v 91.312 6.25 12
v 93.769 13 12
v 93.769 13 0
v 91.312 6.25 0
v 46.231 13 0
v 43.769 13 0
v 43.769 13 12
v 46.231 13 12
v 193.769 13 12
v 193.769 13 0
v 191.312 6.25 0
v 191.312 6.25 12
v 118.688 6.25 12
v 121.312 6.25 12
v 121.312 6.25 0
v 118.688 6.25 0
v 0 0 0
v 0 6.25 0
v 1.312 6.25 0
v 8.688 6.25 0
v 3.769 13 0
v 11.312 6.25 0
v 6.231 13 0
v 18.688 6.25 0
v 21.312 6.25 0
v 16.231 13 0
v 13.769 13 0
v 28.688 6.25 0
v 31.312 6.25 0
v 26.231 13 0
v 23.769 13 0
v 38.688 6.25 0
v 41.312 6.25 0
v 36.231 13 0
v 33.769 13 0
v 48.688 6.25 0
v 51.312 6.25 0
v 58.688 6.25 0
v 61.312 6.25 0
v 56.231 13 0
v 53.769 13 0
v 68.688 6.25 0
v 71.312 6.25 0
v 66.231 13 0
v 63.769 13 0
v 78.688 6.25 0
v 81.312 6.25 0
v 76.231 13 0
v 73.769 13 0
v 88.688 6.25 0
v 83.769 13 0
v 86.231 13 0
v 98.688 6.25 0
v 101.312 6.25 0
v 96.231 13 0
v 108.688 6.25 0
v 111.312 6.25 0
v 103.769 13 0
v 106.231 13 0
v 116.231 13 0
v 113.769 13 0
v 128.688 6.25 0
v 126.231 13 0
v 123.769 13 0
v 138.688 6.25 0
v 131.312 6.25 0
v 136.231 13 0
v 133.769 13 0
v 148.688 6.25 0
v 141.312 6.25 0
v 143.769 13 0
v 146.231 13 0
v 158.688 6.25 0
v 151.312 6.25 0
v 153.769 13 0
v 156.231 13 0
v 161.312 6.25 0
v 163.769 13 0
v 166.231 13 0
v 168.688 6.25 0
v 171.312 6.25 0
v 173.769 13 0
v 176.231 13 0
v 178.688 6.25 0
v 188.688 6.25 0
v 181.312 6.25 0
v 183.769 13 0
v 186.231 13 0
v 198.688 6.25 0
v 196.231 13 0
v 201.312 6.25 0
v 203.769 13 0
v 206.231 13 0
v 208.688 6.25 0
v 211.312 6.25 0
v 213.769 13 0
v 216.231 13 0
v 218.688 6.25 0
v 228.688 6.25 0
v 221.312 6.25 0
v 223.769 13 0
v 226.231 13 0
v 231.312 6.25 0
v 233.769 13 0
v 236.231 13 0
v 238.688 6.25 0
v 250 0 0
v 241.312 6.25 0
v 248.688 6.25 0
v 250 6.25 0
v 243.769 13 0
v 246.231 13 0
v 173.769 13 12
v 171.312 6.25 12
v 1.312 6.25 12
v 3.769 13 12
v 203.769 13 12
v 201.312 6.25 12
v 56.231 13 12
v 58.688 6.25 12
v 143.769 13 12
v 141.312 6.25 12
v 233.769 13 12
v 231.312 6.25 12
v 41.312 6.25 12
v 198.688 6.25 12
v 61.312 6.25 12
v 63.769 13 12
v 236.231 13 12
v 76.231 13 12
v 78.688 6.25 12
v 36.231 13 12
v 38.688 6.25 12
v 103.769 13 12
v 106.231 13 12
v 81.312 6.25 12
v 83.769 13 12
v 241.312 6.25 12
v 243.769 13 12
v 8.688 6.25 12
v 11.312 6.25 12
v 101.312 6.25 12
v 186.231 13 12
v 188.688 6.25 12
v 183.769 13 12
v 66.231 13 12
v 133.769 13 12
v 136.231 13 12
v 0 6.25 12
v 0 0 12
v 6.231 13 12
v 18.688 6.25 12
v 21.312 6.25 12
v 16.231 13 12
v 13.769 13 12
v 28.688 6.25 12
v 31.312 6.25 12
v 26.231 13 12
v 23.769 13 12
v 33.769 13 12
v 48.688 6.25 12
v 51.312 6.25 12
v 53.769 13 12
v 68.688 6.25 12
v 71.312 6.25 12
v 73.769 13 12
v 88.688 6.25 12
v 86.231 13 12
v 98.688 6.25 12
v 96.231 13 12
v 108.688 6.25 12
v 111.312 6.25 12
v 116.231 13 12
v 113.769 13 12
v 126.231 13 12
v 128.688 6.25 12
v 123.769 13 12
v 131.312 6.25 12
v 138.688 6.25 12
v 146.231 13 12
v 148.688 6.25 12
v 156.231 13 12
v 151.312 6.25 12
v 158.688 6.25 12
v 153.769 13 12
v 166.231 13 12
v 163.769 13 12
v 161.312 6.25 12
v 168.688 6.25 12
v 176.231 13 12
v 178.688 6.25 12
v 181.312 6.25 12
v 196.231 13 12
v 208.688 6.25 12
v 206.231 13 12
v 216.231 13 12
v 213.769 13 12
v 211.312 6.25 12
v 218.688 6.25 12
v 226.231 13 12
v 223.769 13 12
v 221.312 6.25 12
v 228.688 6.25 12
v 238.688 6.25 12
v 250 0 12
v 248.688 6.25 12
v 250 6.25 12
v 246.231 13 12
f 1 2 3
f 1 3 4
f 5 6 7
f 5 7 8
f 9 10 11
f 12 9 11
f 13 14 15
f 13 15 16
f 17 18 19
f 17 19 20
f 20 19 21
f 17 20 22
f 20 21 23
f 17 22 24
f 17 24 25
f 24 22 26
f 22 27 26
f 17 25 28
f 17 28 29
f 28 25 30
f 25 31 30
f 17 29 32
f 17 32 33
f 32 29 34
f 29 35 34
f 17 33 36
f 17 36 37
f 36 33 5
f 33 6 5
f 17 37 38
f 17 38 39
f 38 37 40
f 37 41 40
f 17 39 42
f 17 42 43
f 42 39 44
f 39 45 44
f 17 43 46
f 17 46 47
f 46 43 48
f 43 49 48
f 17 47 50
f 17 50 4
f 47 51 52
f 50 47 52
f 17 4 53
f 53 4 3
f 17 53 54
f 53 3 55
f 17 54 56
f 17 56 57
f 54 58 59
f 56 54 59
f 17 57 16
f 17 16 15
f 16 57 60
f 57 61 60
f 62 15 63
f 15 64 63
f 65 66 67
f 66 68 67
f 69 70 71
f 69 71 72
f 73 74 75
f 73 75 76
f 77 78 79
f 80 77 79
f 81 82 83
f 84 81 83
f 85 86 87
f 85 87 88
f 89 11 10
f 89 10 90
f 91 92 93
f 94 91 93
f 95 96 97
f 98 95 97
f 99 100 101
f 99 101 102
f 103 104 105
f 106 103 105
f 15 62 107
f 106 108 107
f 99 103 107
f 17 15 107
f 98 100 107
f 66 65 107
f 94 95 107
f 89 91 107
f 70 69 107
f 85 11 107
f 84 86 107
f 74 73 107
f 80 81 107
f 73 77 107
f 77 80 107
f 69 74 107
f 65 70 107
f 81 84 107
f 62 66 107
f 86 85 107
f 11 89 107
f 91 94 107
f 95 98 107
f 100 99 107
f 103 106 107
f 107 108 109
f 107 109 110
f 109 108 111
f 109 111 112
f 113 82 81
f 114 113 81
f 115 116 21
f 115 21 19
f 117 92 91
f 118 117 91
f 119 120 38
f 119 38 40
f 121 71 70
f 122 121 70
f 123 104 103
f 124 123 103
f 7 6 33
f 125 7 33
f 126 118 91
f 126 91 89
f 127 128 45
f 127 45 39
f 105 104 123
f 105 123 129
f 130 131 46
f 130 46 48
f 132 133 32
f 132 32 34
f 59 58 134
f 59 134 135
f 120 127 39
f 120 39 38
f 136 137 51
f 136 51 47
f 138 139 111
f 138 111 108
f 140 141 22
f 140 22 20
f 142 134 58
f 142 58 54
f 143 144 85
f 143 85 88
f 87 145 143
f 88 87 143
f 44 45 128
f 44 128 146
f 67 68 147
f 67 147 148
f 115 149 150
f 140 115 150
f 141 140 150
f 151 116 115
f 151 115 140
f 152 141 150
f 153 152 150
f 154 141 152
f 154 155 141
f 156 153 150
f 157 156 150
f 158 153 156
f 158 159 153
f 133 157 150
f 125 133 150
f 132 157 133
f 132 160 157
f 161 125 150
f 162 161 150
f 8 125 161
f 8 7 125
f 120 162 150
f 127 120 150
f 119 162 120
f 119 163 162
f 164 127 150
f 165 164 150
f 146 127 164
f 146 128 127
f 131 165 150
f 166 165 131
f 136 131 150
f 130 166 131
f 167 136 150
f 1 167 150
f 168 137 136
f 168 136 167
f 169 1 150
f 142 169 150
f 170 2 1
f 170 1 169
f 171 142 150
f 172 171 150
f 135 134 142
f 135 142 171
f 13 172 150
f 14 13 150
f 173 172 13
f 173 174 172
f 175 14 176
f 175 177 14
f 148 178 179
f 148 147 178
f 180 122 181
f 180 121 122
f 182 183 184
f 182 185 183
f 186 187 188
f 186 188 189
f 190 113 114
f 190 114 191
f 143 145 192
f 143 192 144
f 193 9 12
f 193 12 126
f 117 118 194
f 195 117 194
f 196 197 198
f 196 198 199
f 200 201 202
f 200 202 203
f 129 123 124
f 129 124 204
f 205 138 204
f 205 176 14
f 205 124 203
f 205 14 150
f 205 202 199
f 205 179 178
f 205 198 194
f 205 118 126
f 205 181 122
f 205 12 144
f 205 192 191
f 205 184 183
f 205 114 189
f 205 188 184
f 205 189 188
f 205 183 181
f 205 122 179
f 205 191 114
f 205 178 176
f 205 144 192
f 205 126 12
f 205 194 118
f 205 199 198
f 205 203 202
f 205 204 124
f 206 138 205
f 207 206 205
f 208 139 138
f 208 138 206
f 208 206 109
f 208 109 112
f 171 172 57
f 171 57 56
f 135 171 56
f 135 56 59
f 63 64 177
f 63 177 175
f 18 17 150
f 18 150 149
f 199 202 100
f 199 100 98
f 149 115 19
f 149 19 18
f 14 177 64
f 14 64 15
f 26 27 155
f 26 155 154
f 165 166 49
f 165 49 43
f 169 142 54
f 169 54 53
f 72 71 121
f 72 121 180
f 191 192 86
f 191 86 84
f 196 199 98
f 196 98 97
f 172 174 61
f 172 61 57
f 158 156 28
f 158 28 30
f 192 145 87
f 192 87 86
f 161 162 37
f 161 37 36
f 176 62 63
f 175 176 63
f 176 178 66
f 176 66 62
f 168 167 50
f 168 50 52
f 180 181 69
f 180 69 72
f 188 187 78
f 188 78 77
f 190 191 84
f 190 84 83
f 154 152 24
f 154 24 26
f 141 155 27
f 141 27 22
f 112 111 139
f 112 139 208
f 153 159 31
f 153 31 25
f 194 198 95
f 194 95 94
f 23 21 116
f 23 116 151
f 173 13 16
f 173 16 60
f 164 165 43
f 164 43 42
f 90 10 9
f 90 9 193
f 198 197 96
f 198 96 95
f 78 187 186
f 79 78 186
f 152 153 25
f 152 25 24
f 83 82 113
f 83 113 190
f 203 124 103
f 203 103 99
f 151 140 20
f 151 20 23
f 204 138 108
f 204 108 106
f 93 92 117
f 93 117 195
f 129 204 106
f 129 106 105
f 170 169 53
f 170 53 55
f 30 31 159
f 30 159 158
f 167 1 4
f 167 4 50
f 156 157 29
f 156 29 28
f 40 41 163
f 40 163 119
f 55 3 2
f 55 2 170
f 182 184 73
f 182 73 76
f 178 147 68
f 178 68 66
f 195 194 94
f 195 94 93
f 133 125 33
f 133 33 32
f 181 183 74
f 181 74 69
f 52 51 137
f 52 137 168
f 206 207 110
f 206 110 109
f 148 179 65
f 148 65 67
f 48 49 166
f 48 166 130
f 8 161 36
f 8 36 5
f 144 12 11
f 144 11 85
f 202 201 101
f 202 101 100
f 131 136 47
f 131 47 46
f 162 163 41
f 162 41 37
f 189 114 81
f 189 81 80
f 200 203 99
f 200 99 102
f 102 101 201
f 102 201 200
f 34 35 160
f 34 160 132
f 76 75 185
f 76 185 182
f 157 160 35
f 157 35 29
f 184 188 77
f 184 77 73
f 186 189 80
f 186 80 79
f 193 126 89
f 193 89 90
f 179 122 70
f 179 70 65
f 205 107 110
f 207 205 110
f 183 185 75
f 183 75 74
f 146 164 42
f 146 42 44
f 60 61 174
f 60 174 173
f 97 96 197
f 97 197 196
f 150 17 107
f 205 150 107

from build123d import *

# Parameters (mm, degrees)
ESBO_O1_W                = 250
ESBO_O1_H                = 13
RESSALTO_EXTRUS_O1_DEPTH = 12
CORTE_EXTRUS_O1_DEPTH    = 251.625218204
PADR_O_LINEAR1_COUNT     = 28
PADR_O_LINEAR1_PITCH     = 10


with BuildPart() as part:
    # Esboço1 → Ressalto-extrusão1 (new body)
    with BuildSketch(Plane.XY):
        with Locations((125, 6.5)):
            Rectangle(ESBO_O1_W, ESBO_O1_H)
    extrude(amount=RESSALTO_EXTRUS_O1_DEPTH)

    # Esboço2 → Corte-extrusão1 (cut, through all)
    with BuildSketch(Plane.XY.offset(12)):
        Polygon((1.312306109, 6.25), (-1.312306109, 6.25), (-3.778350034, 13.0254), (3.778350034, 13.0254), align=None)
    corte_extrus_o1 = extrude(amount=-CORTE_EXTRUS_O1_DEPTH, mode=Mode.SUBTRACT)

    # Padrão linear1: Corte-extrusão1 ×28
    with Locations(*[(i * PADR_O_LINEAR1_PITCH, 0, 0) for i in range(1, PADR_O_LINEAR1_COUNT)]):
        add(corte_extrus_o1, mode=Mode.SUBTRACT)


solid = part.part
